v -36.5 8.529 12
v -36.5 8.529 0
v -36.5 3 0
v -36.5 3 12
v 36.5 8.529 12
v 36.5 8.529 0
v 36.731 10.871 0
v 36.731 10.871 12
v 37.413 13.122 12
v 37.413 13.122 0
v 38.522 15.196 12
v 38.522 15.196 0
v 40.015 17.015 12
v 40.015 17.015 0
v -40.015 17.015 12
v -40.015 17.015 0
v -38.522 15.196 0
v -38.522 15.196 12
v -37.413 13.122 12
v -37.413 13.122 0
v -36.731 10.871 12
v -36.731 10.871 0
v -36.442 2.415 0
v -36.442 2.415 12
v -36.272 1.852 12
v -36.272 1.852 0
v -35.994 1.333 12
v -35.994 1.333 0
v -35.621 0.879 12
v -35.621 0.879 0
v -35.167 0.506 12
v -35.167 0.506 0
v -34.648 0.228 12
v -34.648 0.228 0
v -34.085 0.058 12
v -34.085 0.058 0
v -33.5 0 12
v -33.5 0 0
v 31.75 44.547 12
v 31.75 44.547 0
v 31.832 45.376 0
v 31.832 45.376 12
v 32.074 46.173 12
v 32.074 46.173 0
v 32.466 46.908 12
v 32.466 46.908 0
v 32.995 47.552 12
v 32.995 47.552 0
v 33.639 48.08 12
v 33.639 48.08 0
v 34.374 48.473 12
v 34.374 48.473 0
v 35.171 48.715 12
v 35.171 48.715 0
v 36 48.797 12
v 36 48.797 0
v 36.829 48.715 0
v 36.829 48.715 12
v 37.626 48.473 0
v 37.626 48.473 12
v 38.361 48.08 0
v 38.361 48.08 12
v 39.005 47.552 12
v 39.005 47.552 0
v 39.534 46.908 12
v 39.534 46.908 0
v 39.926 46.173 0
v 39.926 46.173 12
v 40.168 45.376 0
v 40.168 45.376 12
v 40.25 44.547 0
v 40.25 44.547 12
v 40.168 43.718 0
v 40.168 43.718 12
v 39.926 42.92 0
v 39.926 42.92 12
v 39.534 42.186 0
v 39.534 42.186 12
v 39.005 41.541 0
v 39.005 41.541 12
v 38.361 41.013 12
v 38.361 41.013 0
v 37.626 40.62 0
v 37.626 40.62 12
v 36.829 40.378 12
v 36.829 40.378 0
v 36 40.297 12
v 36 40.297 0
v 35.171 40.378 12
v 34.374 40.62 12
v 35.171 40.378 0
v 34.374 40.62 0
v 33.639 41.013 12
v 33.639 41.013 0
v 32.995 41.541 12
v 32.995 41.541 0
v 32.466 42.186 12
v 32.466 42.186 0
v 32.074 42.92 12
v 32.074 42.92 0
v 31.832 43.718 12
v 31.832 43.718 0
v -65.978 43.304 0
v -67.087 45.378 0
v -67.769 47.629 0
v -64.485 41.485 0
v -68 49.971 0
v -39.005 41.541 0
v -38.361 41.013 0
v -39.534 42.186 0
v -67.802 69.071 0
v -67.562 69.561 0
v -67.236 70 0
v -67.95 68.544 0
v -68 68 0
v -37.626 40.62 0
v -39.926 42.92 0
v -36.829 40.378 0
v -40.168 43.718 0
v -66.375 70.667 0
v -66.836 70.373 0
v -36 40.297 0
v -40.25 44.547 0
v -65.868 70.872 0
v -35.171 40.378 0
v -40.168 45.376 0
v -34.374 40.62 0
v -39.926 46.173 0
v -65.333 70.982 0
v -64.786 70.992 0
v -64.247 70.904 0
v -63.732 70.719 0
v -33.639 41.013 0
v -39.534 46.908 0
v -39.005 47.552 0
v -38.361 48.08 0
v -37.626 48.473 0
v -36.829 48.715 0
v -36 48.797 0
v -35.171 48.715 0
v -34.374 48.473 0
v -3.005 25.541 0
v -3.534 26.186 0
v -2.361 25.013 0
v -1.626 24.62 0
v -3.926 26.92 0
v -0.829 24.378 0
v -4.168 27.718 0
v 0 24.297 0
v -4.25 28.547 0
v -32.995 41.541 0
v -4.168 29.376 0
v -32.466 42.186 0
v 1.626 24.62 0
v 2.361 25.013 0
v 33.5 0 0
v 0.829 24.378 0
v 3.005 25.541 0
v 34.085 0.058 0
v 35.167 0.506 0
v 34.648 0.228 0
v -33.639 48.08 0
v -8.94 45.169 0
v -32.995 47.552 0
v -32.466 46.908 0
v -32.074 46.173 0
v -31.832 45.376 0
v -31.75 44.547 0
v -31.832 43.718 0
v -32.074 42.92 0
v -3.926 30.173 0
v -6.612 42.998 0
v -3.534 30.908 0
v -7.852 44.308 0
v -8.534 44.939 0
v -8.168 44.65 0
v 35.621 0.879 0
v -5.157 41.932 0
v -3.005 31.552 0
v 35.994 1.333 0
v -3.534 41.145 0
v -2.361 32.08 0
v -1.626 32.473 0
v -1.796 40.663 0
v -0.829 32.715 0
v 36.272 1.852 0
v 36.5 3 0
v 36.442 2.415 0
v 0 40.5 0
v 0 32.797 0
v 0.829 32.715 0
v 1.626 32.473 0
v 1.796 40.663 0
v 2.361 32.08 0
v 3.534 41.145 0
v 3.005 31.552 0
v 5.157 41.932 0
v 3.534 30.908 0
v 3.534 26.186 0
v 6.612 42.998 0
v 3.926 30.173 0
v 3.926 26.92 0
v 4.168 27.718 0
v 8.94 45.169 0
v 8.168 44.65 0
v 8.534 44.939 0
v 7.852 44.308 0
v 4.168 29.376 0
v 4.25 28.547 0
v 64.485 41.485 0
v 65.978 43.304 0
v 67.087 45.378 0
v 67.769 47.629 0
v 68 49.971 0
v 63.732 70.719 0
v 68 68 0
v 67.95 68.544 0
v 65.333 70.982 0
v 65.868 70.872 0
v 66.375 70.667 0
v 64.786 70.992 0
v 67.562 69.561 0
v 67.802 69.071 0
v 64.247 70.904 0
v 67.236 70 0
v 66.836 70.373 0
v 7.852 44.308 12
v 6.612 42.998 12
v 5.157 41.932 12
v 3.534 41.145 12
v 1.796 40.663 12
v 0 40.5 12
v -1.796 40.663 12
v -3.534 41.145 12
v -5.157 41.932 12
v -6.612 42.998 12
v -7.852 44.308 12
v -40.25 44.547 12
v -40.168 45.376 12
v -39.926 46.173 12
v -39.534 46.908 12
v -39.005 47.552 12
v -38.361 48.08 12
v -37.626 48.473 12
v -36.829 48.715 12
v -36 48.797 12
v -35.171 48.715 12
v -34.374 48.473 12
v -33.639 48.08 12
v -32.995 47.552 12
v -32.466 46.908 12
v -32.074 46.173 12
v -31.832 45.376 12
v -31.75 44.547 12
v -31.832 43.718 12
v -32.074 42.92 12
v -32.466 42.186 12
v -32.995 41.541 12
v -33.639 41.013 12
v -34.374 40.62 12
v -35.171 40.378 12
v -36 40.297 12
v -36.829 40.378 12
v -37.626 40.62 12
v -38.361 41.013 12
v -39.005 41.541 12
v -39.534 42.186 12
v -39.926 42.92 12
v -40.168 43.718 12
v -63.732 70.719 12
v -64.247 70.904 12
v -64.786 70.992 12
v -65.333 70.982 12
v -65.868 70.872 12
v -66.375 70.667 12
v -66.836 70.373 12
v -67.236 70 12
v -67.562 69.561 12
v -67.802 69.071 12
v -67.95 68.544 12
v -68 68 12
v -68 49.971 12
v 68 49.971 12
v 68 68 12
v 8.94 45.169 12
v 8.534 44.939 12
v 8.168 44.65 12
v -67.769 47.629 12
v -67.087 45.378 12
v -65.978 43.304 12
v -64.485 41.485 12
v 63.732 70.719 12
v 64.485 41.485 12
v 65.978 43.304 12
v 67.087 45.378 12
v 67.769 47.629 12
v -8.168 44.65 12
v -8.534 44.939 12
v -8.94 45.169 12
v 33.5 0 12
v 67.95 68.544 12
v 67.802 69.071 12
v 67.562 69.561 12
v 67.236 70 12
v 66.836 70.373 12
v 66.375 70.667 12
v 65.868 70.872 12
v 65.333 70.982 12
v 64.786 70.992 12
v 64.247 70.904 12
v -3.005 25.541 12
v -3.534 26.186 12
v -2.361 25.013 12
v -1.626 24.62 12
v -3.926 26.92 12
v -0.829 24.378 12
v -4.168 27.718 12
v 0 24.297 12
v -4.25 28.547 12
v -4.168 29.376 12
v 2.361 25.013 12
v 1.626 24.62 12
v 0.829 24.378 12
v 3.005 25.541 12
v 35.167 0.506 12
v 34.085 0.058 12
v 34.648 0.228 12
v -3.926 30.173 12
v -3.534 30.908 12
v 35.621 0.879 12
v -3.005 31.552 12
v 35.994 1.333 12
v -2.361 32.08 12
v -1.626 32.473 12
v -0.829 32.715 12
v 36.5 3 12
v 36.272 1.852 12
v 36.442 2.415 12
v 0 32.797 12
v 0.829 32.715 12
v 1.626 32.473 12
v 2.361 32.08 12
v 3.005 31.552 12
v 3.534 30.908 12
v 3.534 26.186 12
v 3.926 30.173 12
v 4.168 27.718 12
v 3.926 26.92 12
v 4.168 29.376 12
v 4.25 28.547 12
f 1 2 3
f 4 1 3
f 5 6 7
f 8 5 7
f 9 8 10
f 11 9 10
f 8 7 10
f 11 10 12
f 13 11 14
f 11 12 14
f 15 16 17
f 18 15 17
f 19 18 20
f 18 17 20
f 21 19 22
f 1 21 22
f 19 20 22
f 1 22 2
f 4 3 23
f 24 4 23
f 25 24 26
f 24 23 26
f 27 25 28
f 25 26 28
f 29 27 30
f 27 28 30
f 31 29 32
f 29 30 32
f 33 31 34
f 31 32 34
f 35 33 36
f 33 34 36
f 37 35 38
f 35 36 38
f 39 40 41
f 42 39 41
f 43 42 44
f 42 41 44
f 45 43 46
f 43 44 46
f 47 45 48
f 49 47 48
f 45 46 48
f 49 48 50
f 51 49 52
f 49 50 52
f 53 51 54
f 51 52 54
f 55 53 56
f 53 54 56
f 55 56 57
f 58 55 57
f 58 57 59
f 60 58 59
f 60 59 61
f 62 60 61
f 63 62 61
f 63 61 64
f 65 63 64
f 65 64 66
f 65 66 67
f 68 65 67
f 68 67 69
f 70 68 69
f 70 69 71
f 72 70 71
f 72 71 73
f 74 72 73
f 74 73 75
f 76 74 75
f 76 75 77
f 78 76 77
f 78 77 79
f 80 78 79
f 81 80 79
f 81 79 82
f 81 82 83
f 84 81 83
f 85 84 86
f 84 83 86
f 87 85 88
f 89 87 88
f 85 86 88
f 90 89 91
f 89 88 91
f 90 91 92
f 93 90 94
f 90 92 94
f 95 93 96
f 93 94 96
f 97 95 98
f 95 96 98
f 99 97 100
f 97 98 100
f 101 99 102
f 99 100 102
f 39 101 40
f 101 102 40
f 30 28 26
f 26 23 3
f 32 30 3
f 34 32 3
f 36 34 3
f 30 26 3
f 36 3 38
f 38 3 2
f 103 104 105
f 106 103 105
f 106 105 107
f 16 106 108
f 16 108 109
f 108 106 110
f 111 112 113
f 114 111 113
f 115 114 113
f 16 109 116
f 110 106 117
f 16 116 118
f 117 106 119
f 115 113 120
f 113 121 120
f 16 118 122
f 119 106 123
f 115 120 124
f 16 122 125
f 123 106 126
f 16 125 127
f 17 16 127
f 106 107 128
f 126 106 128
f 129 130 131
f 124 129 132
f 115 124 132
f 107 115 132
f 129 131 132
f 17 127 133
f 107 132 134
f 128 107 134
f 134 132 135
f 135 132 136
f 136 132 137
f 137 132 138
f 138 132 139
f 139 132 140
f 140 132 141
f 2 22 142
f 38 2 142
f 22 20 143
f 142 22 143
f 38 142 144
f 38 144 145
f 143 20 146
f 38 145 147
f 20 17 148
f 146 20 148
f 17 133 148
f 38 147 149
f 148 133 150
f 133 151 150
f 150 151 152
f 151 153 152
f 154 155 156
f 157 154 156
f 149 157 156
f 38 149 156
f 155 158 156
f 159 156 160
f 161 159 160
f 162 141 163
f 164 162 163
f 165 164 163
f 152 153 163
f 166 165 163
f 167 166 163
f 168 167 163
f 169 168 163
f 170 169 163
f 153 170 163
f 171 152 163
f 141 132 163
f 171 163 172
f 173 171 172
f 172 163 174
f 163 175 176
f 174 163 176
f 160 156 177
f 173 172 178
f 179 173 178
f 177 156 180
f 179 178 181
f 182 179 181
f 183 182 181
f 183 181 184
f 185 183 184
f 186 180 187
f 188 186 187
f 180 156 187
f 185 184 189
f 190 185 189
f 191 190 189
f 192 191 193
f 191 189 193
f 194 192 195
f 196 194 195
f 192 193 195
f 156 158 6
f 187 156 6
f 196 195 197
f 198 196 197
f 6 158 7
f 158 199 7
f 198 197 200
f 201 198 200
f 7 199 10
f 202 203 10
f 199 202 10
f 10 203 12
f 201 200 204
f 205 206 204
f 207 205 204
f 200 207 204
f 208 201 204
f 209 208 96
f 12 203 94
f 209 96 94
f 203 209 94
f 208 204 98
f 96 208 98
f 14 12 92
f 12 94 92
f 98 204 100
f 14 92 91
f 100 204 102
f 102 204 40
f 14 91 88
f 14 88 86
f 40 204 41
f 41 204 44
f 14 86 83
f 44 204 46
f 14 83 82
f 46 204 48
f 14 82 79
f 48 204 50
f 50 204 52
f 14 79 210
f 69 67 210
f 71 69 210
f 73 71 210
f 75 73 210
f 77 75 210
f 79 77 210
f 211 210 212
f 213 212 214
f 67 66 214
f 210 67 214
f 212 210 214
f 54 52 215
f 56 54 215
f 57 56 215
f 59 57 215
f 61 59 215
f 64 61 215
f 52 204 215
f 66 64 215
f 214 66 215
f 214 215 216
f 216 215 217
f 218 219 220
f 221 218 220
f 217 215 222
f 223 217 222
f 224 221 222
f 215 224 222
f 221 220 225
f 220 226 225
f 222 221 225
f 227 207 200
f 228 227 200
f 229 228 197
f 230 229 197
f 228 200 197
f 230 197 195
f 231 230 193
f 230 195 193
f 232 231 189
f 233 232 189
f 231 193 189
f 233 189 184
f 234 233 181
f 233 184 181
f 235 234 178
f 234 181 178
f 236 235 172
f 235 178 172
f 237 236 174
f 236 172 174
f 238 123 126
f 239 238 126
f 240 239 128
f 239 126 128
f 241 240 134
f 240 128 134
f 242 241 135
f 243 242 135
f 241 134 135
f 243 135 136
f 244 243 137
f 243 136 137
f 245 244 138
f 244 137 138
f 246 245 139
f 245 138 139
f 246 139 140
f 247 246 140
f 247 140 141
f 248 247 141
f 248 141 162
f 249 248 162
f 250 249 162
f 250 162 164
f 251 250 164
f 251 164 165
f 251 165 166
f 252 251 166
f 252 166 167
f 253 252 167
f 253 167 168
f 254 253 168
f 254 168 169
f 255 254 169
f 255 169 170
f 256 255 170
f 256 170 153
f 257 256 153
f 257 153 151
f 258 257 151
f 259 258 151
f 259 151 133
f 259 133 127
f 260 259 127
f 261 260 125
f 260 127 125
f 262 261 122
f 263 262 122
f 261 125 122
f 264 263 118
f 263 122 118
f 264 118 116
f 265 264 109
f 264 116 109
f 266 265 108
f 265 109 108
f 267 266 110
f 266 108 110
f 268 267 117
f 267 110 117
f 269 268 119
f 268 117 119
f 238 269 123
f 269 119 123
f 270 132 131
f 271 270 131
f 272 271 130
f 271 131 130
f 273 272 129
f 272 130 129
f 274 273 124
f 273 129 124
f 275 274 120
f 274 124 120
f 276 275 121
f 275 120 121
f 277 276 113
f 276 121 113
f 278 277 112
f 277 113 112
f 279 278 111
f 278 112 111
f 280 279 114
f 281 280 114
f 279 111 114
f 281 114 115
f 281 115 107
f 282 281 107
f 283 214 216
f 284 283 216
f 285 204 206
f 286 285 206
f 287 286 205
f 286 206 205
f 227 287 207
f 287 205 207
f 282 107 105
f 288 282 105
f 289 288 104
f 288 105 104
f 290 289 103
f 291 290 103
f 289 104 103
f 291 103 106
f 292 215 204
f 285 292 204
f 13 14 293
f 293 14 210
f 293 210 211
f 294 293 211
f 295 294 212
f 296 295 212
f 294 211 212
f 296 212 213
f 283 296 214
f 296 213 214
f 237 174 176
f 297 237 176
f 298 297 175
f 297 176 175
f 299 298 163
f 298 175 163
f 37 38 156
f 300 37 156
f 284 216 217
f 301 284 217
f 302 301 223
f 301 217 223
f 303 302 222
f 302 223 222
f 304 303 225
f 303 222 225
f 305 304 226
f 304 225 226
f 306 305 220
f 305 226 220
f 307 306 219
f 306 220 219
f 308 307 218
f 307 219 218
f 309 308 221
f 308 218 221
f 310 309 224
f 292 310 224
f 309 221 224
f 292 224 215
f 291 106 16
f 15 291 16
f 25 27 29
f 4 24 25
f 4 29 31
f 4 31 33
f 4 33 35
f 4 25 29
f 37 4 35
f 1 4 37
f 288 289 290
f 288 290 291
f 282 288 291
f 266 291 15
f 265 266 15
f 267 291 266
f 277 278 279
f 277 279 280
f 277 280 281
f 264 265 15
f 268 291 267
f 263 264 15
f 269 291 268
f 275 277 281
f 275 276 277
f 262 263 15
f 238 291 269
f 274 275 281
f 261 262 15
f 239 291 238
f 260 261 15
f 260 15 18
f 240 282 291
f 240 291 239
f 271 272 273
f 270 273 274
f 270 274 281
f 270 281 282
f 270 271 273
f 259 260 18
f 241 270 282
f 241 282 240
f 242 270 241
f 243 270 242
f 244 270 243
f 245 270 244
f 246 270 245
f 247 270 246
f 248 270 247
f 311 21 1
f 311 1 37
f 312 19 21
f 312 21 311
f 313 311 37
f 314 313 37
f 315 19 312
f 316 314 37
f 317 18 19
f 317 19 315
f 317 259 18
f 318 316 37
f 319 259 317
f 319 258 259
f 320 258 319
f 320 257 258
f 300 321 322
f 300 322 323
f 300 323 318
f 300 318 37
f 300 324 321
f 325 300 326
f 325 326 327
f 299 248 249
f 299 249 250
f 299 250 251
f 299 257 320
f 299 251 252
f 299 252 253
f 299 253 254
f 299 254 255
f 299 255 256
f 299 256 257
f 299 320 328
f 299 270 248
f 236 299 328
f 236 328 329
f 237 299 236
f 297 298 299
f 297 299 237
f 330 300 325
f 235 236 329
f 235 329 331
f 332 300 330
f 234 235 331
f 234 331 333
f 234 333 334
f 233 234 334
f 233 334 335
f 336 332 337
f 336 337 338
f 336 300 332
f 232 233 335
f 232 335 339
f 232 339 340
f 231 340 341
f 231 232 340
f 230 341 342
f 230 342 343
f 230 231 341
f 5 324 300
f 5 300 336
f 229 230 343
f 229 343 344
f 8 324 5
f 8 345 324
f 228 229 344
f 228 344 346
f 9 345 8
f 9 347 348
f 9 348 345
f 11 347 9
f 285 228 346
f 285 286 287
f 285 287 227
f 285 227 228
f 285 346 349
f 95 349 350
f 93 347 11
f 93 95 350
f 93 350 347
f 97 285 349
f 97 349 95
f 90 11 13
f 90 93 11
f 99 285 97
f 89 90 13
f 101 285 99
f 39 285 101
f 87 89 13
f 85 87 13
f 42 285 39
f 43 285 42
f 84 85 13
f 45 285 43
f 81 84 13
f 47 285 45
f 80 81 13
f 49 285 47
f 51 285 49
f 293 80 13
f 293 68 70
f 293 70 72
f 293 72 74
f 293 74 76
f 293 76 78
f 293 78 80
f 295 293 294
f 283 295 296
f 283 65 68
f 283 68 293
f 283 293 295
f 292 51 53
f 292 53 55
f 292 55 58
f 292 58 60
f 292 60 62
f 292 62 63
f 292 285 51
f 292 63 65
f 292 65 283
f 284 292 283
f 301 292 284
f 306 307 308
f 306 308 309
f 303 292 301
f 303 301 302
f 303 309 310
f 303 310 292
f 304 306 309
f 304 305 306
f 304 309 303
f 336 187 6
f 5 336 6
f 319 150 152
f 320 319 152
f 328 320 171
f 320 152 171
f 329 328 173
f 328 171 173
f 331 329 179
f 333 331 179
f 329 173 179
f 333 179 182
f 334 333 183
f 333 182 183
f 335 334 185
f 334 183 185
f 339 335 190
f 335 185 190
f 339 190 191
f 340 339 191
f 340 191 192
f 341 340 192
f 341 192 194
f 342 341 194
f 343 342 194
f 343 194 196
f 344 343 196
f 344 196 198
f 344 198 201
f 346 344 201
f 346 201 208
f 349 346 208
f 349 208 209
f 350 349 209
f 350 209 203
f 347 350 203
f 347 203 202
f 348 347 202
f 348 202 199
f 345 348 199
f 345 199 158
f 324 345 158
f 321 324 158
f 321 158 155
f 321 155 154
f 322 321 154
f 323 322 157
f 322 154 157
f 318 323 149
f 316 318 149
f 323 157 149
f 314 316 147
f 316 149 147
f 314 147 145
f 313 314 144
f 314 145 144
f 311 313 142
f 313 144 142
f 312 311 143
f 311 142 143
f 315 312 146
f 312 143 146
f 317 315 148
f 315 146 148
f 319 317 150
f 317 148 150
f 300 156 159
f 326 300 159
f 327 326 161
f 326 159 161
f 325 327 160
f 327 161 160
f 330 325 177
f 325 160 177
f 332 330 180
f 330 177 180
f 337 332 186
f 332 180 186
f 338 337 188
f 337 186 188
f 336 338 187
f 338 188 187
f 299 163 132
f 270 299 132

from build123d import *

# Parameters (mm, degrees)
EXTRUDE1_DEPTH         = 12
M10_GEVINDHULLER_D     = 8.5
M10_GEVINDHULLER_DEPTH = 22
M10_GEVINDHULLER_TIP   = 2.553657631


with BuildPart() as part:
    # Sketch1 → Extrude1 (new body)
    with BuildSketch(Plane.XY):
        with BuildLine():
            Line((36.5, 3), (36.5, 8.529437252))
            ThreePointArc((36.5, 8.529437252), (37.41344561, 13.12163844), (40.014718626, 17.014718626))
            Line((40.014718626, 17.014718626), (64.485281374, 41.485281374))
            ThreePointArc((64.485281374, 41.485281374), (67.08655439, 45.37836156), (68, 49.970562748))
            Line((68, 49.970562748), (68, 68))
            ThreePointArc((68, 68), (66.611898825, 70.530174337), (63.732145215, 70.718923361))
            Line((63.732145215, 70.718923361), (8.939617358, 45.168748012))
            ThreePointArc((8.939617358, 45.168748012), (8.345295598, 44.801908517), (7.851901649, 44.307588803))
            ThreePointArc((7.851901649, 44.307588803), (0, 40.500135977), (-7.851901649, 44.307588803))
            ThreePointArc((-7.851901649, 44.307588803), (-8.345295598, 44.801908517), (-8.939617358, 45.168748012))
            Line((-8.939617358, 45.168748012), (-63.732145215, 70.718923361))
            ThreePointArc((-63.732145215, 70.718923361), (-66.611898825, 70.530174337), (-68, 68))
            Line((-68, 68), (-68, 49.970562748))
            ThreePointArc((-68, 49.970562748), (-67.08655439, 45.37836156), (-64.485281374, 41.485281374))
            Line((-64.485281374, 41.485281374), (-40.014718626, 17.014718626))
            ThreePointArc((-40.014718626, 17.014718626), (-37.41344561, 13.12163844), (-36.5, 8.529437252))
            Line((-36.5, 8.529437252), (-36.5, 3))
            ThreePointArc((-36.5, 3), (-35.621320344, 0.878679656), (-33.5, 0))
            Line((-33.5, 0), (0, 0))
            Line((0, 0), (33.5, 0))
            ThreePointArc((33.5, 0), (35.621320344, 0.878679656), (36.5, 3))
        make_face()
    extrude(amount=EXTRUDE1_DEPTH)

    # M10 gevindhuller
    with Locations(Plane.XY.offset(12)):
        with Locations((-36, 44.546676643), (0, 28.546676643), (36, 44.546676643)):
            Hole(M10_GEVINDHULLER_D / 2, depth=M10_GEVINDHULLER_DEPTH)
            with Locations((0, 0, -(M10_GEVINDHULLER_DEPTH + M10_GEVINDHULLER_TIP / 2))):  # 118° drill point
                Cone(0, M10_GEVINDHULLER_D / 2, M10_GEVINDHULLER_TIP, mode=Mode.SUBTRACT)


solid = part.part
